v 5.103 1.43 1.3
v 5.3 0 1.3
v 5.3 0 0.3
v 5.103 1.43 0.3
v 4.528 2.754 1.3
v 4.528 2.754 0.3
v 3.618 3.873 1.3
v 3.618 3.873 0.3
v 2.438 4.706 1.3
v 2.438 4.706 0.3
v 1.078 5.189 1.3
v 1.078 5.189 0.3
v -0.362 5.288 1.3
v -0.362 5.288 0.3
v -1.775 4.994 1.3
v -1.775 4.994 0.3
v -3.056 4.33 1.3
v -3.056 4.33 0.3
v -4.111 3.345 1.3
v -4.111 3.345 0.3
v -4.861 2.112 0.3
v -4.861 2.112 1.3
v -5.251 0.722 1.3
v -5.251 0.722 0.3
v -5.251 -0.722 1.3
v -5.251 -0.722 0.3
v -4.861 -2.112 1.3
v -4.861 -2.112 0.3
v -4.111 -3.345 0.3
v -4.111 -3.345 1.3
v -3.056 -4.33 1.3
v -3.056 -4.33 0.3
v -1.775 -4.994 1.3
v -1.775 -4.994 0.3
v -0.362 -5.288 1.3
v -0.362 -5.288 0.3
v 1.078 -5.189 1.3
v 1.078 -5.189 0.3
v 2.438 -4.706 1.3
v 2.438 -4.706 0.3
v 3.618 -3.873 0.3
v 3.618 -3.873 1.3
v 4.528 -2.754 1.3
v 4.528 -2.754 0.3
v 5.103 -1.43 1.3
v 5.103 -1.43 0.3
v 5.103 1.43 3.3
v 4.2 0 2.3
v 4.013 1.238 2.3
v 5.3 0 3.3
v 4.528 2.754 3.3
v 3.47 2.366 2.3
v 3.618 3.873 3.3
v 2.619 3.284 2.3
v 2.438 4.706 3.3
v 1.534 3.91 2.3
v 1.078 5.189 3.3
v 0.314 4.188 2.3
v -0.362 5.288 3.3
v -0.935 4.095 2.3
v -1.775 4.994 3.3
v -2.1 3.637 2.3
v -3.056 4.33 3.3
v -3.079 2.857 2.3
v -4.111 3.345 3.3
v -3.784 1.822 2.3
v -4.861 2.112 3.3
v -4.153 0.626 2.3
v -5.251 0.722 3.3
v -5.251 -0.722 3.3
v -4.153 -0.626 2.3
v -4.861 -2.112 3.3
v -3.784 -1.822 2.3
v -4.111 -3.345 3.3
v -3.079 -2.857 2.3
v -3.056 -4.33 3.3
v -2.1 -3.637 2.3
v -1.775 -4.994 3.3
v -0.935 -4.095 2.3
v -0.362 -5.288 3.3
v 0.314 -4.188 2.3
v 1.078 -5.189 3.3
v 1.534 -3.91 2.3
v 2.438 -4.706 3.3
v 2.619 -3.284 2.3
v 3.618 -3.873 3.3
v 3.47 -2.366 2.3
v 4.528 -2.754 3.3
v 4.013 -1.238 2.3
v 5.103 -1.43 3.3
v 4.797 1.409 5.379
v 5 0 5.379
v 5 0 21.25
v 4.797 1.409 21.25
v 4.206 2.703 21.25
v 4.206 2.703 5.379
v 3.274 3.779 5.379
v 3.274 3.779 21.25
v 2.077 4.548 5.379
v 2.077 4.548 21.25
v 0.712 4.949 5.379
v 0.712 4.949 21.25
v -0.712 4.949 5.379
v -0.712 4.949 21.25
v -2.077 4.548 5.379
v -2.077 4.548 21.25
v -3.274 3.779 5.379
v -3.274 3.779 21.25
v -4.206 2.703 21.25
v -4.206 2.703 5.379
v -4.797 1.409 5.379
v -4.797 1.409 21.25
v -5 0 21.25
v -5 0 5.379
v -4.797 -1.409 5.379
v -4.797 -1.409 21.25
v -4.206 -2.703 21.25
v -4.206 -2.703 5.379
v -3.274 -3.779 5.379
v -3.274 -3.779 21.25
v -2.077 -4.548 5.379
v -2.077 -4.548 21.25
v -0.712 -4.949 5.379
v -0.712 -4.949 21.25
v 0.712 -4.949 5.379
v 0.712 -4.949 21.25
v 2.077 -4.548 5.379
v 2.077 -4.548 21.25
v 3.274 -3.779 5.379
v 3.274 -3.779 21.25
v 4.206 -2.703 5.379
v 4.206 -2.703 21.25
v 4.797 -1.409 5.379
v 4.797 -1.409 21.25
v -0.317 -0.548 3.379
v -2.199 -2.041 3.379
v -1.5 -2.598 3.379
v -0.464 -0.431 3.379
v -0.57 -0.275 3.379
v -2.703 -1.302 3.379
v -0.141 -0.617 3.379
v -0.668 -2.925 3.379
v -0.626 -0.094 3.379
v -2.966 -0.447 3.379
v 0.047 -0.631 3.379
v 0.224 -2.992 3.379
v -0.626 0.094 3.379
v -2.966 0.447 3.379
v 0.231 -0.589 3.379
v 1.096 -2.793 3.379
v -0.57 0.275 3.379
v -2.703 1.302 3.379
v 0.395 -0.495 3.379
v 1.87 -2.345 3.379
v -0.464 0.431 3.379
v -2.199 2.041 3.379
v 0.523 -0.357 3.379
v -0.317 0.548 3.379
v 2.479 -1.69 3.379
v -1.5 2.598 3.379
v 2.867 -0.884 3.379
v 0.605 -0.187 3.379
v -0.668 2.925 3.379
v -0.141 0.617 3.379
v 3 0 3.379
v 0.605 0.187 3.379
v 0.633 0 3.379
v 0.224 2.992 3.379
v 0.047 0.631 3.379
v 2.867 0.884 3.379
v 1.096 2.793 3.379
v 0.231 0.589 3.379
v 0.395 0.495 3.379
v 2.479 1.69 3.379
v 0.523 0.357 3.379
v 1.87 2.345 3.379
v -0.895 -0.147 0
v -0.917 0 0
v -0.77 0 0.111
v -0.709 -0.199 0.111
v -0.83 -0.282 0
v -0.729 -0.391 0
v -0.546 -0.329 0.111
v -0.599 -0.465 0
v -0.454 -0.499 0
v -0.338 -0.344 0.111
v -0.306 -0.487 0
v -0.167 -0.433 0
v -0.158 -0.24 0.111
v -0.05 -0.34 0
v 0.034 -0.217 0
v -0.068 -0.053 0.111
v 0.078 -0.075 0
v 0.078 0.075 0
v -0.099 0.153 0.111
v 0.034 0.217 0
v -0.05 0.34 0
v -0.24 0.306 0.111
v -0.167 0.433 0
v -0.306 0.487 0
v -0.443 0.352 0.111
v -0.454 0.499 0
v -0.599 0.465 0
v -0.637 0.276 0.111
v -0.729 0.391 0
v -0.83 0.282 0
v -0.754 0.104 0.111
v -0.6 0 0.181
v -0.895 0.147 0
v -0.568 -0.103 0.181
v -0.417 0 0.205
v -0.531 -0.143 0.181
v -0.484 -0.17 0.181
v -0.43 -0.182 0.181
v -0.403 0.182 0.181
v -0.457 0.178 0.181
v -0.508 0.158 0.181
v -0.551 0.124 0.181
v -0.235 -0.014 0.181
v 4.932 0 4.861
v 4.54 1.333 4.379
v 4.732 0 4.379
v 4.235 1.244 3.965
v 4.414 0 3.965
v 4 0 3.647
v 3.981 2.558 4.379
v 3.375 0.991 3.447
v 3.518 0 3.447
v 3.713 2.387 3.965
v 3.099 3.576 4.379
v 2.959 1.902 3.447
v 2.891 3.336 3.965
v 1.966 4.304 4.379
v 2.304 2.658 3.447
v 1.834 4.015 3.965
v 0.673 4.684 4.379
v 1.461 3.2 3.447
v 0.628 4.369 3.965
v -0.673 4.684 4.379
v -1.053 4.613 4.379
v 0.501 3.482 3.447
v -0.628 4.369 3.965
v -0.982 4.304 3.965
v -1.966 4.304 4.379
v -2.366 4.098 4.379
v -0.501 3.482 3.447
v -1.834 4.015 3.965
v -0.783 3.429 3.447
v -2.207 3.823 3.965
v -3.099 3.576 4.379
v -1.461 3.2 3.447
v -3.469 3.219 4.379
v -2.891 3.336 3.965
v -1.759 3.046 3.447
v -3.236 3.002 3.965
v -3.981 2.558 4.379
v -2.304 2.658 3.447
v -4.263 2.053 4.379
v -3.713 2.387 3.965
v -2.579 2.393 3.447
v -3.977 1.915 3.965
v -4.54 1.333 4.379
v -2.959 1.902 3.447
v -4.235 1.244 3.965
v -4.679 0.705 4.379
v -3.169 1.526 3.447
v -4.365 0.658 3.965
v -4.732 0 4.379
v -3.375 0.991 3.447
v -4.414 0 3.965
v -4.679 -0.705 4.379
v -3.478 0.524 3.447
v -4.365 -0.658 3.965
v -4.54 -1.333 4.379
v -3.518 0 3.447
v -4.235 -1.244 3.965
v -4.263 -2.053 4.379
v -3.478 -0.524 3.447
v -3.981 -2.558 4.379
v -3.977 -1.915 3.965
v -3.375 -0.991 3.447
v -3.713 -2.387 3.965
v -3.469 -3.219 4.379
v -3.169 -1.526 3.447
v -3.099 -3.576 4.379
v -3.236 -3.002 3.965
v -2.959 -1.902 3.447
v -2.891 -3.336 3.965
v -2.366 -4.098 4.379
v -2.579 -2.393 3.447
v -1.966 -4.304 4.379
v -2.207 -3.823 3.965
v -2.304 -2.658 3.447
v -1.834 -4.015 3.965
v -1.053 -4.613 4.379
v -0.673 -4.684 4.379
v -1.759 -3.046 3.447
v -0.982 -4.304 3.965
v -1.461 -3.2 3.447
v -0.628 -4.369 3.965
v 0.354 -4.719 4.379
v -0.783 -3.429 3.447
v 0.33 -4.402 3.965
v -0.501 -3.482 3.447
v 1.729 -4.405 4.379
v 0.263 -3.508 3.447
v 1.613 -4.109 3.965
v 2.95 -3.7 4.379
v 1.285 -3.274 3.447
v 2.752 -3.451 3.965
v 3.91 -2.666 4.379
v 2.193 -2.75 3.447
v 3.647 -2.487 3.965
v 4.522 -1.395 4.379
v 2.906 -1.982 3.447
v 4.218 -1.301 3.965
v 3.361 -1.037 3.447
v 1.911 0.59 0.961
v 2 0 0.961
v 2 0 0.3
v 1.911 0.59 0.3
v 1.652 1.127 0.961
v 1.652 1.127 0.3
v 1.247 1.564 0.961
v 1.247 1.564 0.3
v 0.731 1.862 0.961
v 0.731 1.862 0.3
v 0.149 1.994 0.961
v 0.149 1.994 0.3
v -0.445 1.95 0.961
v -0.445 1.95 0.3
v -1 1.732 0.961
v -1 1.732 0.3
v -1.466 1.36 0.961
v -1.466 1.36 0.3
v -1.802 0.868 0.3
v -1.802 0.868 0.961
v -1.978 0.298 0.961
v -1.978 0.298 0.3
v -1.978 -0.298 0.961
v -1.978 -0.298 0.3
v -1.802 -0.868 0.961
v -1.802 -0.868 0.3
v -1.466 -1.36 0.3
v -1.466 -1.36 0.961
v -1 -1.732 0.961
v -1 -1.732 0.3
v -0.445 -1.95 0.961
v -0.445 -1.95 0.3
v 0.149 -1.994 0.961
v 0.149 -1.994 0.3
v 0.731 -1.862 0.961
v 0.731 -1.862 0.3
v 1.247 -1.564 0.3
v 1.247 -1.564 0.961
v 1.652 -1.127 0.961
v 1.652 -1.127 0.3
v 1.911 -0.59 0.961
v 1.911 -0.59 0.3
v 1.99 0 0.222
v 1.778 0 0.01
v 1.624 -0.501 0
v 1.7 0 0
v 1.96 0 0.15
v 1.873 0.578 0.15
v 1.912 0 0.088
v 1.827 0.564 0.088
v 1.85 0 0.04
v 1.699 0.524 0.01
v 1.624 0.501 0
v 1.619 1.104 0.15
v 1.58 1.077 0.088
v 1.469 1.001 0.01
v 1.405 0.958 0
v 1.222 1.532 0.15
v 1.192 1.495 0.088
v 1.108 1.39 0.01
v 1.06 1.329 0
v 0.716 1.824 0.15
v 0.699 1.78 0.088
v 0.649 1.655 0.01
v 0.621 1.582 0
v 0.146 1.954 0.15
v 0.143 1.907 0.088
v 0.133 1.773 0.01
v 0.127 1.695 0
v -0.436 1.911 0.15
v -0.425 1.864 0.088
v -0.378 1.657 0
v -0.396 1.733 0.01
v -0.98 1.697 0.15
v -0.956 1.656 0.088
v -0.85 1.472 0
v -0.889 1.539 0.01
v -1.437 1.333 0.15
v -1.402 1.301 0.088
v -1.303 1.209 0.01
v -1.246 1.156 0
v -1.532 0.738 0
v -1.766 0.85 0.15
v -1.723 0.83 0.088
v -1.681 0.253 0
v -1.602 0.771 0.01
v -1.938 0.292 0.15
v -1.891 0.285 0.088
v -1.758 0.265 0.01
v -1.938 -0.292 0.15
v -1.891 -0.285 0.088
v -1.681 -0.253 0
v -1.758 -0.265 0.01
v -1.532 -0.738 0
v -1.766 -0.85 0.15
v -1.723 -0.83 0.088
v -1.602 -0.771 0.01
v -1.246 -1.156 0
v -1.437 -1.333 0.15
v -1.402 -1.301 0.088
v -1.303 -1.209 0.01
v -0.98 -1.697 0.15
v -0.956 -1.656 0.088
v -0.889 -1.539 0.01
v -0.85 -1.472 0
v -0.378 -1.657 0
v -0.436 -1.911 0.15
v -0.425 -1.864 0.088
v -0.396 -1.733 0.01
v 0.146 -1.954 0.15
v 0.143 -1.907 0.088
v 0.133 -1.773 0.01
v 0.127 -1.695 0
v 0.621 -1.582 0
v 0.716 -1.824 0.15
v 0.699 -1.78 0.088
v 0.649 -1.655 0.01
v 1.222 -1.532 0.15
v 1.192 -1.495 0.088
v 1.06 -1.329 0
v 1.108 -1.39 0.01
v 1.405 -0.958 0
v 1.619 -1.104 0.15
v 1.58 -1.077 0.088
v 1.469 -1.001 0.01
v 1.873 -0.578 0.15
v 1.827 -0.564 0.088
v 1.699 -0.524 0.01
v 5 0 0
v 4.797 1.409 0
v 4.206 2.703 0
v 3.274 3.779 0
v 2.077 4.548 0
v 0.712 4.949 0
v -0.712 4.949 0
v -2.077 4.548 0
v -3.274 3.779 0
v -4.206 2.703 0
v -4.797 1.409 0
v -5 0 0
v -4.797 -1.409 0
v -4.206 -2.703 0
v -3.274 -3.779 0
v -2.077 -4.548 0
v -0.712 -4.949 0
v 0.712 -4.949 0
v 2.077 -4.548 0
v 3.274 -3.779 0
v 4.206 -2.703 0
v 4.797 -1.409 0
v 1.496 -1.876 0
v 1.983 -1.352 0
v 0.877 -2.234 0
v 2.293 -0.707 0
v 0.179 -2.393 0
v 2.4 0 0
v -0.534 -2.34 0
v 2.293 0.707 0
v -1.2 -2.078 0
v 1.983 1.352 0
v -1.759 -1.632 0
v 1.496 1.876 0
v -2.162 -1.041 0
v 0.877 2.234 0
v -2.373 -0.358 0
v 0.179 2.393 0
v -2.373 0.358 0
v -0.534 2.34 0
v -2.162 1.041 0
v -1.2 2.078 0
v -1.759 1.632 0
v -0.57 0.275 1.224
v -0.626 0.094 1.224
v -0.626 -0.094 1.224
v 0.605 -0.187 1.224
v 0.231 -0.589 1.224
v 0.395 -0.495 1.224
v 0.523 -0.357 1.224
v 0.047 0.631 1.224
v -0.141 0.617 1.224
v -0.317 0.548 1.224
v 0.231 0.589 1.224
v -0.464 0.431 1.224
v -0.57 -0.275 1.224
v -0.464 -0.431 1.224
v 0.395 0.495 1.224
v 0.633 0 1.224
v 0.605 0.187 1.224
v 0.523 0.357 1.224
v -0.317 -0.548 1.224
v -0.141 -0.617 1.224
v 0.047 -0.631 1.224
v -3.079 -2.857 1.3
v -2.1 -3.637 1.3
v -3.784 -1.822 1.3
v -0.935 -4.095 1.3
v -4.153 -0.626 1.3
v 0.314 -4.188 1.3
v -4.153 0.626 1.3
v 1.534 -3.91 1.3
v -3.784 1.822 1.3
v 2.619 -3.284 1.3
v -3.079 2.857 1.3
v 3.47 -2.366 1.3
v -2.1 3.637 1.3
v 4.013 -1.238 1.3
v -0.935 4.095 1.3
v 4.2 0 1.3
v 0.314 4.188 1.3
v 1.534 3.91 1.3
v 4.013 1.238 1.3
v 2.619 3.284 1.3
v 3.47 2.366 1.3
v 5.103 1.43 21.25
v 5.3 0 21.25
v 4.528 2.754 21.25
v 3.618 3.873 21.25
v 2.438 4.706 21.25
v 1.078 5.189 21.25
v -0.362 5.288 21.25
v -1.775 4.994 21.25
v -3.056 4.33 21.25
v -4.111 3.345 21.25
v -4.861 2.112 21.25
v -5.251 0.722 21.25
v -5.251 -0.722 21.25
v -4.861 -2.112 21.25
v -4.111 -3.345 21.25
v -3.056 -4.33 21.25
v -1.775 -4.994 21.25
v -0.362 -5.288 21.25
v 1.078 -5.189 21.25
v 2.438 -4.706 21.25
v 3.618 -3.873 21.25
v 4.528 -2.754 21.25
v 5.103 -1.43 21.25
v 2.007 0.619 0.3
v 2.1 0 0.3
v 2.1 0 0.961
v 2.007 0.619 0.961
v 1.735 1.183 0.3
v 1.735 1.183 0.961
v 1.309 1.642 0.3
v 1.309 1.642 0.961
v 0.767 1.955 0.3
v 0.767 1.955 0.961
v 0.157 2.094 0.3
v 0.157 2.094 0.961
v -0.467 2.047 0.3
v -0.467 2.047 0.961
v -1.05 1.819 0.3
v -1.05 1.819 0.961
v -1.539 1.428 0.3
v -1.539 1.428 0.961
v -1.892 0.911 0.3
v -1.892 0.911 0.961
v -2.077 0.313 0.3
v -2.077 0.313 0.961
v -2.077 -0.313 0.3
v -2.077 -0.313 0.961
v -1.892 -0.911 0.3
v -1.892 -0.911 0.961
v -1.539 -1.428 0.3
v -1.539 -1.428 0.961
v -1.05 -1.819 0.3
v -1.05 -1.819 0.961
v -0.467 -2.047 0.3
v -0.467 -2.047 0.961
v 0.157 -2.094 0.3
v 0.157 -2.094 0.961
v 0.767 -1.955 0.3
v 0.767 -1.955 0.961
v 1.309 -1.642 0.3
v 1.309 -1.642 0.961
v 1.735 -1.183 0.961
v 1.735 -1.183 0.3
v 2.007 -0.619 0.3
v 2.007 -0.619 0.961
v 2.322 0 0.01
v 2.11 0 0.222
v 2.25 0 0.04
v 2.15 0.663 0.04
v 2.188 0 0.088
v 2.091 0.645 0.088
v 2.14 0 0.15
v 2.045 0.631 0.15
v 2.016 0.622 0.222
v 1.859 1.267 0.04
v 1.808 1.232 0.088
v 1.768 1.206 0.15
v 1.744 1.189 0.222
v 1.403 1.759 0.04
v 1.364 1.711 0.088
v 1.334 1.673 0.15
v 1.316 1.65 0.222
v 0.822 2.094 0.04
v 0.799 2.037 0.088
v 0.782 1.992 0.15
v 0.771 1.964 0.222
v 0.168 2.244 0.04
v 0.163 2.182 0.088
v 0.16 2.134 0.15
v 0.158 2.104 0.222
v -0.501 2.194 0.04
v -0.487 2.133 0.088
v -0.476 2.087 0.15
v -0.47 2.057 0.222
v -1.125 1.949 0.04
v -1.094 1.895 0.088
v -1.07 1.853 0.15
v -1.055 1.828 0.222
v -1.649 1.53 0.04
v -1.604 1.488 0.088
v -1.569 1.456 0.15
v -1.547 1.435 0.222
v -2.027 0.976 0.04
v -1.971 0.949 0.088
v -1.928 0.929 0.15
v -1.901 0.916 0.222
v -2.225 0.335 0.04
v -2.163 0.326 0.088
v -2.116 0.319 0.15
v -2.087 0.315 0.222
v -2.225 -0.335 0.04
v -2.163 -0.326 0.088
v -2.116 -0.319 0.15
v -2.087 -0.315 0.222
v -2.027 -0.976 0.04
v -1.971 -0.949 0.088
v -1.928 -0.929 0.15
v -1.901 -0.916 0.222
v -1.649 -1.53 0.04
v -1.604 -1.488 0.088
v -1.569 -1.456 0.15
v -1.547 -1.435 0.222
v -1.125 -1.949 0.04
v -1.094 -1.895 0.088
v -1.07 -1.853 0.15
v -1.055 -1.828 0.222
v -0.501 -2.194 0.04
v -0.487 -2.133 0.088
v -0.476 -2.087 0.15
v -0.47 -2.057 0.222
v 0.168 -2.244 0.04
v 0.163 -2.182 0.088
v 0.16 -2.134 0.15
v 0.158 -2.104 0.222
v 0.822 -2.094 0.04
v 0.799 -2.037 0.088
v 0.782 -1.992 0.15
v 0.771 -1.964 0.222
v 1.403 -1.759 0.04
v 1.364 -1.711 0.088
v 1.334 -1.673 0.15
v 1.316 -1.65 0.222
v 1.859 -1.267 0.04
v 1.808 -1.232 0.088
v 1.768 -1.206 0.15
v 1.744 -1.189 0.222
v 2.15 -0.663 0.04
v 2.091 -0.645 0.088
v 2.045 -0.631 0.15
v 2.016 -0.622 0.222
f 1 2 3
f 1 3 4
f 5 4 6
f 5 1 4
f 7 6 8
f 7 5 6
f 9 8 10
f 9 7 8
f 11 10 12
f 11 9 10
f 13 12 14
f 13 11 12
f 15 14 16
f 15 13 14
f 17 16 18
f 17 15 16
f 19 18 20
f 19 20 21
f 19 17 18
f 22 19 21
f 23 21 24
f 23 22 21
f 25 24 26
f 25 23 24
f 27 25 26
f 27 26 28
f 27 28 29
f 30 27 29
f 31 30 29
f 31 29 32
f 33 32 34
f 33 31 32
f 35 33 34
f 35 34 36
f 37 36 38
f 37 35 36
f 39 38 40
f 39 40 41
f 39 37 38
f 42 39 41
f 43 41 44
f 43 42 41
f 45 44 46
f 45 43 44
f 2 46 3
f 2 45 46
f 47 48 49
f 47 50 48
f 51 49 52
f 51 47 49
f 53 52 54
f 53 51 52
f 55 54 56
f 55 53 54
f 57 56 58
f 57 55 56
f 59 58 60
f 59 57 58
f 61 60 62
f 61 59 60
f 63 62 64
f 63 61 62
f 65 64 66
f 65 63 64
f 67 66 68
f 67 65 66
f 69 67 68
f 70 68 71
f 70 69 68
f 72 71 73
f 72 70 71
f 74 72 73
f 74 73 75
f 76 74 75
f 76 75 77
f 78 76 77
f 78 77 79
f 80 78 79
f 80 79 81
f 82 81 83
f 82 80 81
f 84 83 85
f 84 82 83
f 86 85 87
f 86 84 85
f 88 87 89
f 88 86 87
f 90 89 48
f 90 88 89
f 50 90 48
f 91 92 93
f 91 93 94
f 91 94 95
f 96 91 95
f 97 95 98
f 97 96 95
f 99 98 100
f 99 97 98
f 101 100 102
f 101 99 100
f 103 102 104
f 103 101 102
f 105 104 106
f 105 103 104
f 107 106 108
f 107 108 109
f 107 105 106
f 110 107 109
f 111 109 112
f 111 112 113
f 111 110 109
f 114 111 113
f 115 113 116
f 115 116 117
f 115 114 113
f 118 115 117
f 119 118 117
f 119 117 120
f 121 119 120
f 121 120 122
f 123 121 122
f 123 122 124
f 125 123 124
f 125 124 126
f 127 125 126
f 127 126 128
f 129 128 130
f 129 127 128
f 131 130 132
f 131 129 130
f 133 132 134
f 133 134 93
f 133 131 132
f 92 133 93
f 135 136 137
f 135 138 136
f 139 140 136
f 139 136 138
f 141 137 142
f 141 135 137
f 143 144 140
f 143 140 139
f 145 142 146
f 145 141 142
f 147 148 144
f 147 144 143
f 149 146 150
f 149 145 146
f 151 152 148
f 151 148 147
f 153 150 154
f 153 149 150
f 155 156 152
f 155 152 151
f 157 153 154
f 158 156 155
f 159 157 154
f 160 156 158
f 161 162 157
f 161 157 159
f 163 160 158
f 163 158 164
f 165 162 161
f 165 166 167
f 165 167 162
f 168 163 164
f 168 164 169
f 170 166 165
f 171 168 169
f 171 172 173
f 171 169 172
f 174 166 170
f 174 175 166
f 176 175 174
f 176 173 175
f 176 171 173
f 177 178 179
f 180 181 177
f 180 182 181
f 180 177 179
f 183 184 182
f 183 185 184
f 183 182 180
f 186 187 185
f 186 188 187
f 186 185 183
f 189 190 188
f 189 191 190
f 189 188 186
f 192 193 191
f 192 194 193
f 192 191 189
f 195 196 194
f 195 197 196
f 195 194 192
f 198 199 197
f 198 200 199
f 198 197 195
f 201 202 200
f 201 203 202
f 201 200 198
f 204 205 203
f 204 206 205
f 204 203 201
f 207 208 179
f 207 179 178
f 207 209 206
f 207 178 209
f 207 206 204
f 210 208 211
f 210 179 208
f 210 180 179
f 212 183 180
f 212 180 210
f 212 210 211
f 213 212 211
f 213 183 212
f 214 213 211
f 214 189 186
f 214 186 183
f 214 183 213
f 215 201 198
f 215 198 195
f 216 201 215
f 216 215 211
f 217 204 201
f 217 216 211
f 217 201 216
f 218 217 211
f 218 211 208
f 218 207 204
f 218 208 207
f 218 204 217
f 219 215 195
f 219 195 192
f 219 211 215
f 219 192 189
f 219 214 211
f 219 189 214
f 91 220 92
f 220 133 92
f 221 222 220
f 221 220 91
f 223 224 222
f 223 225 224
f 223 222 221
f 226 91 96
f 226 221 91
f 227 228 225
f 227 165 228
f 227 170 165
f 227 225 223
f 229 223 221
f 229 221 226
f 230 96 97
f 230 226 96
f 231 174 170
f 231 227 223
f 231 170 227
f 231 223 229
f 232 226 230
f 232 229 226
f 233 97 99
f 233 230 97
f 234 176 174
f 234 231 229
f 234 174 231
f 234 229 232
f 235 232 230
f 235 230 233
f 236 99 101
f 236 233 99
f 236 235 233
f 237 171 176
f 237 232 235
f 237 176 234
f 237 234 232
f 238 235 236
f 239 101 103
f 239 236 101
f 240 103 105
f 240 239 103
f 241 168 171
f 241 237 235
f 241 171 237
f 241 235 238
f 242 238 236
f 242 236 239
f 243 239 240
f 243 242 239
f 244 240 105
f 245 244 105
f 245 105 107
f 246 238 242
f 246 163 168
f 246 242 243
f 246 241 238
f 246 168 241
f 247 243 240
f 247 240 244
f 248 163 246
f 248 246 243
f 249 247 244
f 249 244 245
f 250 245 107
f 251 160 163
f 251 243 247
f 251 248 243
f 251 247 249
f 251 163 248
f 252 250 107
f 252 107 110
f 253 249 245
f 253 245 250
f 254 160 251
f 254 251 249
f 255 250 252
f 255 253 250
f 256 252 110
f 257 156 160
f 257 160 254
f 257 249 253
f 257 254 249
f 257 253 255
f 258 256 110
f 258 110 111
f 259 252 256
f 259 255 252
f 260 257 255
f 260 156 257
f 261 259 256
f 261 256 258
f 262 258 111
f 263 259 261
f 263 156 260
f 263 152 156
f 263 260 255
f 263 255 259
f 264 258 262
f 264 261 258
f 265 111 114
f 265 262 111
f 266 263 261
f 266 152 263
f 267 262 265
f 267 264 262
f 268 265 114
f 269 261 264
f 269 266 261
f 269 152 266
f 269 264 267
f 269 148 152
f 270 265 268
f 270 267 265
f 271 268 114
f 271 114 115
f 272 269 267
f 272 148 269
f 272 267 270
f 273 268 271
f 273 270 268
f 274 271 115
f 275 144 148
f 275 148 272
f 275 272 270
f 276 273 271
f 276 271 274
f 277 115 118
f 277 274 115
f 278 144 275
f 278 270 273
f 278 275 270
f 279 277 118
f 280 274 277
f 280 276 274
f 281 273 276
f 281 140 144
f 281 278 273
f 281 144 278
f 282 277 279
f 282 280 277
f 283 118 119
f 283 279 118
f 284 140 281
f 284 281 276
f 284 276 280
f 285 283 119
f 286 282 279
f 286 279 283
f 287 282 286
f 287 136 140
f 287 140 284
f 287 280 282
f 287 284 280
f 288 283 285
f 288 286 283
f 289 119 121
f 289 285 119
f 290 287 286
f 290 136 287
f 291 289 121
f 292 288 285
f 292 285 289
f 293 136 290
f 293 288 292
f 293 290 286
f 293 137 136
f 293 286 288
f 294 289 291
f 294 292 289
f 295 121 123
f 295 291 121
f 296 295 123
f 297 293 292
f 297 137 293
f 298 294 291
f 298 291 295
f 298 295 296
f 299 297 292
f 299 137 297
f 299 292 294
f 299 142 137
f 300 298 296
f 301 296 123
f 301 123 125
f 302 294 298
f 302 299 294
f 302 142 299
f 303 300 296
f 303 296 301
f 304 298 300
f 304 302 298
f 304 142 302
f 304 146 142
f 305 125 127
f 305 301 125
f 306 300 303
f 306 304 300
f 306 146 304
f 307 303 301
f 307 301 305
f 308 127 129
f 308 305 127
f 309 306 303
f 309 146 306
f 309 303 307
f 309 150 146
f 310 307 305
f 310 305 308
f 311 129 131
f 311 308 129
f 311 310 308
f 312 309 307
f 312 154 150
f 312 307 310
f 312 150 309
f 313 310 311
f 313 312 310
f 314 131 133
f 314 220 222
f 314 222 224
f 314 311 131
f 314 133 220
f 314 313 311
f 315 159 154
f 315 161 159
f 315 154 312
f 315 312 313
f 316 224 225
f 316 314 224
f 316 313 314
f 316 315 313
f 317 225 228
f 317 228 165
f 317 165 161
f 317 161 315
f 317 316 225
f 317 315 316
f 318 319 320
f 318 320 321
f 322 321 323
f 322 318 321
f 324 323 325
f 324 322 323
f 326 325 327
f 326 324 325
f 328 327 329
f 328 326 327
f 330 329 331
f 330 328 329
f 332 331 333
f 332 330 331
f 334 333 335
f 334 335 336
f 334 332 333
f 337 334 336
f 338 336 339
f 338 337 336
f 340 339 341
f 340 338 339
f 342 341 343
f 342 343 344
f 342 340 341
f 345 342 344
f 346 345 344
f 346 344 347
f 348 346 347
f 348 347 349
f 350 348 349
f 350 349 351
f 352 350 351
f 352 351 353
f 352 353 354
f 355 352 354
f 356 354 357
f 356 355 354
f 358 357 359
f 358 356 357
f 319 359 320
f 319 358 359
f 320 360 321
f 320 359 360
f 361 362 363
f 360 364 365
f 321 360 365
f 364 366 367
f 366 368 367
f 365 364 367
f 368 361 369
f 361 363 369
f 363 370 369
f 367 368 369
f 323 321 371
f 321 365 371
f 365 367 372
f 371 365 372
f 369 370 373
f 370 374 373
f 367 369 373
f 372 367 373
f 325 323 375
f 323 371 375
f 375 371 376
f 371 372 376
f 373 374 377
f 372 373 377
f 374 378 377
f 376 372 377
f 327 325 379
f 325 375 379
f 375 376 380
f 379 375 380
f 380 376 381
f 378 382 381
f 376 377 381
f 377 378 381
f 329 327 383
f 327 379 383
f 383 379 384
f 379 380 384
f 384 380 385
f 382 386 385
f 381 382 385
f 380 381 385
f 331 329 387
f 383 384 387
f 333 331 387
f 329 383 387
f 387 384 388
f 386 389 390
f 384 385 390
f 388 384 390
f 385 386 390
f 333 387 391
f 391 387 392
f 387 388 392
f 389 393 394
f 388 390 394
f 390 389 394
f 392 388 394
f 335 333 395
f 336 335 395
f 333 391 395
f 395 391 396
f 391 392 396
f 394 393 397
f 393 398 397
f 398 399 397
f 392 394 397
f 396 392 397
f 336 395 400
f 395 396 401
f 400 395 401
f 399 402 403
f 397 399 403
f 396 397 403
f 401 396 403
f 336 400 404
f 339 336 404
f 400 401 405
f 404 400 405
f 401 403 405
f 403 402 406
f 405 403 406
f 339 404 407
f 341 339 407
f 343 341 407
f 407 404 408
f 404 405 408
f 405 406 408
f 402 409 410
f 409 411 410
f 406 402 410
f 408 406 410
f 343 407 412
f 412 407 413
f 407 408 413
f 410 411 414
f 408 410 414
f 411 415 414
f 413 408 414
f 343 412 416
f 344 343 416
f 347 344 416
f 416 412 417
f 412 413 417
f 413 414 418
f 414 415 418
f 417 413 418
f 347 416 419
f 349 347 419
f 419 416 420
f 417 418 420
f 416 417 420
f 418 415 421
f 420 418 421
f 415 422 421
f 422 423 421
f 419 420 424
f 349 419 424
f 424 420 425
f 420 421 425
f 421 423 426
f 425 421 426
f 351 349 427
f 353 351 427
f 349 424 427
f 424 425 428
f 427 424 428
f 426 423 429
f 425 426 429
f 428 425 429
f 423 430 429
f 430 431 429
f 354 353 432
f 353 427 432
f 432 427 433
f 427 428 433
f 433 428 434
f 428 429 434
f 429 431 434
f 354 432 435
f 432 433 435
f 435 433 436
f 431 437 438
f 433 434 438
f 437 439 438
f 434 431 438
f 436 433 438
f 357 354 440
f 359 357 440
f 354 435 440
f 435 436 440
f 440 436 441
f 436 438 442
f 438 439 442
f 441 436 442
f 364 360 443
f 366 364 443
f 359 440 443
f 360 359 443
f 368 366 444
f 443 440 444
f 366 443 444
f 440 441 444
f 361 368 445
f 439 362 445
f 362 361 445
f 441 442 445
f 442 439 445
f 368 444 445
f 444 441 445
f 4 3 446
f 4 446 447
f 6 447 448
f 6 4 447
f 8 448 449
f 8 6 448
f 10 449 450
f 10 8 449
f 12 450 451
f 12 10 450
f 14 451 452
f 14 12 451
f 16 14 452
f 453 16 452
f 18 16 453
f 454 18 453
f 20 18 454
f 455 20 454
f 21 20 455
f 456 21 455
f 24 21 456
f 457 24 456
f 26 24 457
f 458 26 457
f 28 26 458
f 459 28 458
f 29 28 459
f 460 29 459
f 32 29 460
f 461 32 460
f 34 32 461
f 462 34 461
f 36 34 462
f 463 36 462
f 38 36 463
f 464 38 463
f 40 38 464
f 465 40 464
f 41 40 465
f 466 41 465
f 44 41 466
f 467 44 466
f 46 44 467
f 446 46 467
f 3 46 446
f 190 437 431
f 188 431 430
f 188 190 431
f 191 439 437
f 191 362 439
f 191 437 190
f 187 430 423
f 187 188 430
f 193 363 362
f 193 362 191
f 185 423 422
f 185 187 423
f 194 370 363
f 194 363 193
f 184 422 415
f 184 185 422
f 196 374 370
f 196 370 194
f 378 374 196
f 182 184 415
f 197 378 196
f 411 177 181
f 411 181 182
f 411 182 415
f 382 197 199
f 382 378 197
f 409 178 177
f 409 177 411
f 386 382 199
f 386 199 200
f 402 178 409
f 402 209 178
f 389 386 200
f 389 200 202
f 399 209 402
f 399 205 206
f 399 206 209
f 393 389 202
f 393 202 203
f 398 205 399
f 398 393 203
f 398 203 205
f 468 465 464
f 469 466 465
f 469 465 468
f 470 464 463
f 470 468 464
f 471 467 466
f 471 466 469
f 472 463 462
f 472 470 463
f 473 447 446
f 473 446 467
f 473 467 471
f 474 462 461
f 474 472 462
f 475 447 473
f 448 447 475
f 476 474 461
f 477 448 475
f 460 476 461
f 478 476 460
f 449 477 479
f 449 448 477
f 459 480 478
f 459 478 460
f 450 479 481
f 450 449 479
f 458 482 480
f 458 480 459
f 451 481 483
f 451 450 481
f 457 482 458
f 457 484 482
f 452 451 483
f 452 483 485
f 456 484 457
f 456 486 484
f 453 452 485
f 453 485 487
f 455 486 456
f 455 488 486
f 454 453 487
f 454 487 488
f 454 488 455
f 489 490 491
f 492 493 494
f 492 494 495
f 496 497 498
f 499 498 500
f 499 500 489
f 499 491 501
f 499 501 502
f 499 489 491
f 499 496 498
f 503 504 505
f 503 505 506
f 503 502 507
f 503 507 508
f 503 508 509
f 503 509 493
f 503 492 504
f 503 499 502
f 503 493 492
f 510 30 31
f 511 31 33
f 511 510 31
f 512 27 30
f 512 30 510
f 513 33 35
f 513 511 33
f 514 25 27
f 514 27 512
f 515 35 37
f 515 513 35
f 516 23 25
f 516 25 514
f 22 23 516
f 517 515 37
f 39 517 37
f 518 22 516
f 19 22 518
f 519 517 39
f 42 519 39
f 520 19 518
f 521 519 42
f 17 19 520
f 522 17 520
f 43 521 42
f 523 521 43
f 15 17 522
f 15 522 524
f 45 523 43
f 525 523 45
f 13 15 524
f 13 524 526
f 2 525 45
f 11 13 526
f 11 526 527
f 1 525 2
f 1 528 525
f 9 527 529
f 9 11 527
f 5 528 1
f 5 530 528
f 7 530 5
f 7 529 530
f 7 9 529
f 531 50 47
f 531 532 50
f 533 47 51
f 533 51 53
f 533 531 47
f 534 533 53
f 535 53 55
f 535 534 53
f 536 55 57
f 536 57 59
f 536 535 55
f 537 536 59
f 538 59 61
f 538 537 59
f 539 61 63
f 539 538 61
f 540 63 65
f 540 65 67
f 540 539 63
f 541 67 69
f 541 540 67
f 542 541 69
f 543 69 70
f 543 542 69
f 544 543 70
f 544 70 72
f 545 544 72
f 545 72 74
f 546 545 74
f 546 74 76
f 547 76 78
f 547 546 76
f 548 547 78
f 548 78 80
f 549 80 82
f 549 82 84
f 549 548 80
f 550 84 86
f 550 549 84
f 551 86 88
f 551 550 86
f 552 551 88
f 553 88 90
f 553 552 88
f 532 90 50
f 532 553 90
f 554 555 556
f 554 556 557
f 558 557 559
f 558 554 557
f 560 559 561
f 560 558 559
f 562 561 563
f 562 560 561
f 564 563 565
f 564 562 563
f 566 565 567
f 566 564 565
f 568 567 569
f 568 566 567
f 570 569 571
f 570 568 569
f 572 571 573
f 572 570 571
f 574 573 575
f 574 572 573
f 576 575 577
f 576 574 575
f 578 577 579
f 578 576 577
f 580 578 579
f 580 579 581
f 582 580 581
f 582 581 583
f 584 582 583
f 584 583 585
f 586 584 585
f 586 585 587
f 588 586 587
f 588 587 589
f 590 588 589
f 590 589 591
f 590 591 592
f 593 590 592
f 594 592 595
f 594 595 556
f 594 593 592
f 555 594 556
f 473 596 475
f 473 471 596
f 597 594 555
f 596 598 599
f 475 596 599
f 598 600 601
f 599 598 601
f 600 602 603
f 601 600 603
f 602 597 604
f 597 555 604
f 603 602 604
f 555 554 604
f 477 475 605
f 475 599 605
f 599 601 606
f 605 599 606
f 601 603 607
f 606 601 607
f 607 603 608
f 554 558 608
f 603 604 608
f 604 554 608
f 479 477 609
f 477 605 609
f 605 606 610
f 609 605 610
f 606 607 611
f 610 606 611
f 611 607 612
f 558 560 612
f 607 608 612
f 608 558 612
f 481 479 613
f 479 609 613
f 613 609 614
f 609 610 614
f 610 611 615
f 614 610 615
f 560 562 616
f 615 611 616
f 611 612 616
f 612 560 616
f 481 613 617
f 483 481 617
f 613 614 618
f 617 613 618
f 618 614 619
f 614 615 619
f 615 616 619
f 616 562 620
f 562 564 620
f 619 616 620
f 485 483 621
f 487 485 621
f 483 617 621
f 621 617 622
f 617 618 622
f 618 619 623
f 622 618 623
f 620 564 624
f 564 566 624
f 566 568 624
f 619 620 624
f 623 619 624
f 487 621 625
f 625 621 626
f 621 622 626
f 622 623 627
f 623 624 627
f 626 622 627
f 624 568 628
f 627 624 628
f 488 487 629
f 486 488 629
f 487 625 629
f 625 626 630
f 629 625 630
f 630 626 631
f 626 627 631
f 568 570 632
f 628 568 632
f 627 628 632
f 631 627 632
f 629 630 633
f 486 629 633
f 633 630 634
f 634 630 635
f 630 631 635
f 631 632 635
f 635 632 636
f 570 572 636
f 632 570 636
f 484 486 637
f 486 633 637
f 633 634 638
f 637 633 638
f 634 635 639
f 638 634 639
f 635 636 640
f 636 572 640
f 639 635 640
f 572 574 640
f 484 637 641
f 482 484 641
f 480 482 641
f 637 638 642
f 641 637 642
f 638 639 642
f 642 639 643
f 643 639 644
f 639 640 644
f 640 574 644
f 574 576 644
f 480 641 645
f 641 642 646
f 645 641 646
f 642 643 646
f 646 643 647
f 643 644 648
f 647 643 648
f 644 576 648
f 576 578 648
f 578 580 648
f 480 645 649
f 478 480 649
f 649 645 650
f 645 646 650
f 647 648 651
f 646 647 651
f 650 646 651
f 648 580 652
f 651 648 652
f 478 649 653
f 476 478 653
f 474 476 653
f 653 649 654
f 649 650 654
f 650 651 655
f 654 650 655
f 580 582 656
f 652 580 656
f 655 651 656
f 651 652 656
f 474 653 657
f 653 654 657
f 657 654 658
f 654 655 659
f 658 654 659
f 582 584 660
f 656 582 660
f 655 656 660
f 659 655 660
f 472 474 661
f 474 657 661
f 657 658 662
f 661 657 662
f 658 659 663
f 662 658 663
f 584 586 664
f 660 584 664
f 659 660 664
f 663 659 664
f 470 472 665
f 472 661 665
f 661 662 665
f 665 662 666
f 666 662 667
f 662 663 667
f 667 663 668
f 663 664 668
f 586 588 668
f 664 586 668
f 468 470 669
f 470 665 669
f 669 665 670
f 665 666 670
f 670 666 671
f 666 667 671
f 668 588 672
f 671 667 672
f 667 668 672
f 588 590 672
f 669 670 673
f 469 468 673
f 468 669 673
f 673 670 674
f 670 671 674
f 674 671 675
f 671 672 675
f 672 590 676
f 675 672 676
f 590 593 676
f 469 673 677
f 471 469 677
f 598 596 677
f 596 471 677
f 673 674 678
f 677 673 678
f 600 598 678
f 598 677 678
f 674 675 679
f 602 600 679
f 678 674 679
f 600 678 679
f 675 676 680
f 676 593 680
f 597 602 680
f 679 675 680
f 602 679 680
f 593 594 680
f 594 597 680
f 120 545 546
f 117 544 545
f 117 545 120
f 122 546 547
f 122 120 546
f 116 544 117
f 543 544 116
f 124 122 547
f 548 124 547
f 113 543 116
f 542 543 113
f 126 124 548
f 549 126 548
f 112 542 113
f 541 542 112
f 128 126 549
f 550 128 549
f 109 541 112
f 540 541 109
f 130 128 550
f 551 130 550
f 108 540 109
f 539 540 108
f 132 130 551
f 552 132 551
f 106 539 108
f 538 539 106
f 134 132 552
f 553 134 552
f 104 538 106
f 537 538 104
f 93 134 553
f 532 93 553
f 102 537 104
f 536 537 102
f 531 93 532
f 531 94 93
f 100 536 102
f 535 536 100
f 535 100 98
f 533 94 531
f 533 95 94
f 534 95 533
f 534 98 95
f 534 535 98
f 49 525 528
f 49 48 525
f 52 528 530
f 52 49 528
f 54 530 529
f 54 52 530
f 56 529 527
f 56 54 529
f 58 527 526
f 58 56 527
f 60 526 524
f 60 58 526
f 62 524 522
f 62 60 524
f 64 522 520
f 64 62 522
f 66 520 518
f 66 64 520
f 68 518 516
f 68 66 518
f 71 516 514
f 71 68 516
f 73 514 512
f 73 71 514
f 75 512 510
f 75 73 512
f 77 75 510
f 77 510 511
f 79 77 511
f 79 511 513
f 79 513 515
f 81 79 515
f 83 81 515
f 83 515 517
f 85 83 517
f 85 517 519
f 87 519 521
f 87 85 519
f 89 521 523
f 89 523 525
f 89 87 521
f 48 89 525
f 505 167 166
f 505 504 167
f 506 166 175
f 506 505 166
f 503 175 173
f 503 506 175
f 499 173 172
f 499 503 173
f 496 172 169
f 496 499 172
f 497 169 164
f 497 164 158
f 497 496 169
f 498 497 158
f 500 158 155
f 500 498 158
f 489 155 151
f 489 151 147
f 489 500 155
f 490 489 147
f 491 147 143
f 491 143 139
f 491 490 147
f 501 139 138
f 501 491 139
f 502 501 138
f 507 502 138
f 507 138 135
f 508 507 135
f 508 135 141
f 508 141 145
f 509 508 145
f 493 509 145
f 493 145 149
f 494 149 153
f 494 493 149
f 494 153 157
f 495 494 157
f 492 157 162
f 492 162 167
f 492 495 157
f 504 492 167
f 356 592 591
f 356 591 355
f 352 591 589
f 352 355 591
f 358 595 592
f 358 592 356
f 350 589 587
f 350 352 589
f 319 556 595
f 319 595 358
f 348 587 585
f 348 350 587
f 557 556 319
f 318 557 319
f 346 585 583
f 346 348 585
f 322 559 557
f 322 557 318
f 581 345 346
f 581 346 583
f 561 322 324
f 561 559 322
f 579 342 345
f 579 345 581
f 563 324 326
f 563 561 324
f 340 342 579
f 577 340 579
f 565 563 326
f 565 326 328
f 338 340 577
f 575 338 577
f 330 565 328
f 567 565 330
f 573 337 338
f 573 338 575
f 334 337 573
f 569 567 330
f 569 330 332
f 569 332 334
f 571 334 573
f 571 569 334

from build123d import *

# Parameters (mm, degrees)
F2_R    = 2
F3_R    = 0.3
F4_SIZE = 0.3


with BuildPart() as f1:
    # F0 (on Front) → F1 (revolve)
    with BuildSketch(Plane.XZ):
        Polygon((2.1, 0), (5.3, 0), (5.3, 1.3), (4.2, 1.3), (4.2, 2.3), (5.3, 3.3), (5.3, 21.25), (5, 21.25), (5, 3.378872), (0.63314, 3.378872), (0.63314, 1.22387), (0, 1.22387), (0, 0), (2, 0), (2, 0.961065), (2.1, 0.961065), align=None)
    revolve(axis=Axis((0, 0, 10.625), (0, 0, 1)))

    # F2
    f2_edges = [f1.edges().sort_by_distance(p)[0] for p in [
        (-5, 0, 3.378872),
    ]]
    fillet(f2_edges, radius=F2_R)

    # F3
    f3_edges = [f1.edges().sort_by_distance(p)[0] for p in [
        (-2.1, 0, 0),
        (-2, 0, 0),
    ]]
    fillet(f3_edges, radius=F3_R)

    # F4
    f4_edges = [f1.edges().sort_by_distance(p)[0] for p in [
        (-5.3, 0, 0),
    ]]
    chamfer(f4_edges, length=F4_SIZE)

    # F5 (on Front) → F6 (revolve, cut)
    with BuildSketch(Plane.XZ):
        with BuildLine():
            Line((-0.916817, 0), (-0.416817, 0))
            Line((-0.416817, 0), (-0.416817, 0.205113))
            ThreePointArc((-0.416817, 0.205113), (-0.687035, 0.151842), (-0.916817, 0))
        make_face()
    revolve(axis=Axis((-0.416817, 0, 0.102557), (0, 0, 1)), mode=Mode.SUBTRACT)


solid = f1.part
